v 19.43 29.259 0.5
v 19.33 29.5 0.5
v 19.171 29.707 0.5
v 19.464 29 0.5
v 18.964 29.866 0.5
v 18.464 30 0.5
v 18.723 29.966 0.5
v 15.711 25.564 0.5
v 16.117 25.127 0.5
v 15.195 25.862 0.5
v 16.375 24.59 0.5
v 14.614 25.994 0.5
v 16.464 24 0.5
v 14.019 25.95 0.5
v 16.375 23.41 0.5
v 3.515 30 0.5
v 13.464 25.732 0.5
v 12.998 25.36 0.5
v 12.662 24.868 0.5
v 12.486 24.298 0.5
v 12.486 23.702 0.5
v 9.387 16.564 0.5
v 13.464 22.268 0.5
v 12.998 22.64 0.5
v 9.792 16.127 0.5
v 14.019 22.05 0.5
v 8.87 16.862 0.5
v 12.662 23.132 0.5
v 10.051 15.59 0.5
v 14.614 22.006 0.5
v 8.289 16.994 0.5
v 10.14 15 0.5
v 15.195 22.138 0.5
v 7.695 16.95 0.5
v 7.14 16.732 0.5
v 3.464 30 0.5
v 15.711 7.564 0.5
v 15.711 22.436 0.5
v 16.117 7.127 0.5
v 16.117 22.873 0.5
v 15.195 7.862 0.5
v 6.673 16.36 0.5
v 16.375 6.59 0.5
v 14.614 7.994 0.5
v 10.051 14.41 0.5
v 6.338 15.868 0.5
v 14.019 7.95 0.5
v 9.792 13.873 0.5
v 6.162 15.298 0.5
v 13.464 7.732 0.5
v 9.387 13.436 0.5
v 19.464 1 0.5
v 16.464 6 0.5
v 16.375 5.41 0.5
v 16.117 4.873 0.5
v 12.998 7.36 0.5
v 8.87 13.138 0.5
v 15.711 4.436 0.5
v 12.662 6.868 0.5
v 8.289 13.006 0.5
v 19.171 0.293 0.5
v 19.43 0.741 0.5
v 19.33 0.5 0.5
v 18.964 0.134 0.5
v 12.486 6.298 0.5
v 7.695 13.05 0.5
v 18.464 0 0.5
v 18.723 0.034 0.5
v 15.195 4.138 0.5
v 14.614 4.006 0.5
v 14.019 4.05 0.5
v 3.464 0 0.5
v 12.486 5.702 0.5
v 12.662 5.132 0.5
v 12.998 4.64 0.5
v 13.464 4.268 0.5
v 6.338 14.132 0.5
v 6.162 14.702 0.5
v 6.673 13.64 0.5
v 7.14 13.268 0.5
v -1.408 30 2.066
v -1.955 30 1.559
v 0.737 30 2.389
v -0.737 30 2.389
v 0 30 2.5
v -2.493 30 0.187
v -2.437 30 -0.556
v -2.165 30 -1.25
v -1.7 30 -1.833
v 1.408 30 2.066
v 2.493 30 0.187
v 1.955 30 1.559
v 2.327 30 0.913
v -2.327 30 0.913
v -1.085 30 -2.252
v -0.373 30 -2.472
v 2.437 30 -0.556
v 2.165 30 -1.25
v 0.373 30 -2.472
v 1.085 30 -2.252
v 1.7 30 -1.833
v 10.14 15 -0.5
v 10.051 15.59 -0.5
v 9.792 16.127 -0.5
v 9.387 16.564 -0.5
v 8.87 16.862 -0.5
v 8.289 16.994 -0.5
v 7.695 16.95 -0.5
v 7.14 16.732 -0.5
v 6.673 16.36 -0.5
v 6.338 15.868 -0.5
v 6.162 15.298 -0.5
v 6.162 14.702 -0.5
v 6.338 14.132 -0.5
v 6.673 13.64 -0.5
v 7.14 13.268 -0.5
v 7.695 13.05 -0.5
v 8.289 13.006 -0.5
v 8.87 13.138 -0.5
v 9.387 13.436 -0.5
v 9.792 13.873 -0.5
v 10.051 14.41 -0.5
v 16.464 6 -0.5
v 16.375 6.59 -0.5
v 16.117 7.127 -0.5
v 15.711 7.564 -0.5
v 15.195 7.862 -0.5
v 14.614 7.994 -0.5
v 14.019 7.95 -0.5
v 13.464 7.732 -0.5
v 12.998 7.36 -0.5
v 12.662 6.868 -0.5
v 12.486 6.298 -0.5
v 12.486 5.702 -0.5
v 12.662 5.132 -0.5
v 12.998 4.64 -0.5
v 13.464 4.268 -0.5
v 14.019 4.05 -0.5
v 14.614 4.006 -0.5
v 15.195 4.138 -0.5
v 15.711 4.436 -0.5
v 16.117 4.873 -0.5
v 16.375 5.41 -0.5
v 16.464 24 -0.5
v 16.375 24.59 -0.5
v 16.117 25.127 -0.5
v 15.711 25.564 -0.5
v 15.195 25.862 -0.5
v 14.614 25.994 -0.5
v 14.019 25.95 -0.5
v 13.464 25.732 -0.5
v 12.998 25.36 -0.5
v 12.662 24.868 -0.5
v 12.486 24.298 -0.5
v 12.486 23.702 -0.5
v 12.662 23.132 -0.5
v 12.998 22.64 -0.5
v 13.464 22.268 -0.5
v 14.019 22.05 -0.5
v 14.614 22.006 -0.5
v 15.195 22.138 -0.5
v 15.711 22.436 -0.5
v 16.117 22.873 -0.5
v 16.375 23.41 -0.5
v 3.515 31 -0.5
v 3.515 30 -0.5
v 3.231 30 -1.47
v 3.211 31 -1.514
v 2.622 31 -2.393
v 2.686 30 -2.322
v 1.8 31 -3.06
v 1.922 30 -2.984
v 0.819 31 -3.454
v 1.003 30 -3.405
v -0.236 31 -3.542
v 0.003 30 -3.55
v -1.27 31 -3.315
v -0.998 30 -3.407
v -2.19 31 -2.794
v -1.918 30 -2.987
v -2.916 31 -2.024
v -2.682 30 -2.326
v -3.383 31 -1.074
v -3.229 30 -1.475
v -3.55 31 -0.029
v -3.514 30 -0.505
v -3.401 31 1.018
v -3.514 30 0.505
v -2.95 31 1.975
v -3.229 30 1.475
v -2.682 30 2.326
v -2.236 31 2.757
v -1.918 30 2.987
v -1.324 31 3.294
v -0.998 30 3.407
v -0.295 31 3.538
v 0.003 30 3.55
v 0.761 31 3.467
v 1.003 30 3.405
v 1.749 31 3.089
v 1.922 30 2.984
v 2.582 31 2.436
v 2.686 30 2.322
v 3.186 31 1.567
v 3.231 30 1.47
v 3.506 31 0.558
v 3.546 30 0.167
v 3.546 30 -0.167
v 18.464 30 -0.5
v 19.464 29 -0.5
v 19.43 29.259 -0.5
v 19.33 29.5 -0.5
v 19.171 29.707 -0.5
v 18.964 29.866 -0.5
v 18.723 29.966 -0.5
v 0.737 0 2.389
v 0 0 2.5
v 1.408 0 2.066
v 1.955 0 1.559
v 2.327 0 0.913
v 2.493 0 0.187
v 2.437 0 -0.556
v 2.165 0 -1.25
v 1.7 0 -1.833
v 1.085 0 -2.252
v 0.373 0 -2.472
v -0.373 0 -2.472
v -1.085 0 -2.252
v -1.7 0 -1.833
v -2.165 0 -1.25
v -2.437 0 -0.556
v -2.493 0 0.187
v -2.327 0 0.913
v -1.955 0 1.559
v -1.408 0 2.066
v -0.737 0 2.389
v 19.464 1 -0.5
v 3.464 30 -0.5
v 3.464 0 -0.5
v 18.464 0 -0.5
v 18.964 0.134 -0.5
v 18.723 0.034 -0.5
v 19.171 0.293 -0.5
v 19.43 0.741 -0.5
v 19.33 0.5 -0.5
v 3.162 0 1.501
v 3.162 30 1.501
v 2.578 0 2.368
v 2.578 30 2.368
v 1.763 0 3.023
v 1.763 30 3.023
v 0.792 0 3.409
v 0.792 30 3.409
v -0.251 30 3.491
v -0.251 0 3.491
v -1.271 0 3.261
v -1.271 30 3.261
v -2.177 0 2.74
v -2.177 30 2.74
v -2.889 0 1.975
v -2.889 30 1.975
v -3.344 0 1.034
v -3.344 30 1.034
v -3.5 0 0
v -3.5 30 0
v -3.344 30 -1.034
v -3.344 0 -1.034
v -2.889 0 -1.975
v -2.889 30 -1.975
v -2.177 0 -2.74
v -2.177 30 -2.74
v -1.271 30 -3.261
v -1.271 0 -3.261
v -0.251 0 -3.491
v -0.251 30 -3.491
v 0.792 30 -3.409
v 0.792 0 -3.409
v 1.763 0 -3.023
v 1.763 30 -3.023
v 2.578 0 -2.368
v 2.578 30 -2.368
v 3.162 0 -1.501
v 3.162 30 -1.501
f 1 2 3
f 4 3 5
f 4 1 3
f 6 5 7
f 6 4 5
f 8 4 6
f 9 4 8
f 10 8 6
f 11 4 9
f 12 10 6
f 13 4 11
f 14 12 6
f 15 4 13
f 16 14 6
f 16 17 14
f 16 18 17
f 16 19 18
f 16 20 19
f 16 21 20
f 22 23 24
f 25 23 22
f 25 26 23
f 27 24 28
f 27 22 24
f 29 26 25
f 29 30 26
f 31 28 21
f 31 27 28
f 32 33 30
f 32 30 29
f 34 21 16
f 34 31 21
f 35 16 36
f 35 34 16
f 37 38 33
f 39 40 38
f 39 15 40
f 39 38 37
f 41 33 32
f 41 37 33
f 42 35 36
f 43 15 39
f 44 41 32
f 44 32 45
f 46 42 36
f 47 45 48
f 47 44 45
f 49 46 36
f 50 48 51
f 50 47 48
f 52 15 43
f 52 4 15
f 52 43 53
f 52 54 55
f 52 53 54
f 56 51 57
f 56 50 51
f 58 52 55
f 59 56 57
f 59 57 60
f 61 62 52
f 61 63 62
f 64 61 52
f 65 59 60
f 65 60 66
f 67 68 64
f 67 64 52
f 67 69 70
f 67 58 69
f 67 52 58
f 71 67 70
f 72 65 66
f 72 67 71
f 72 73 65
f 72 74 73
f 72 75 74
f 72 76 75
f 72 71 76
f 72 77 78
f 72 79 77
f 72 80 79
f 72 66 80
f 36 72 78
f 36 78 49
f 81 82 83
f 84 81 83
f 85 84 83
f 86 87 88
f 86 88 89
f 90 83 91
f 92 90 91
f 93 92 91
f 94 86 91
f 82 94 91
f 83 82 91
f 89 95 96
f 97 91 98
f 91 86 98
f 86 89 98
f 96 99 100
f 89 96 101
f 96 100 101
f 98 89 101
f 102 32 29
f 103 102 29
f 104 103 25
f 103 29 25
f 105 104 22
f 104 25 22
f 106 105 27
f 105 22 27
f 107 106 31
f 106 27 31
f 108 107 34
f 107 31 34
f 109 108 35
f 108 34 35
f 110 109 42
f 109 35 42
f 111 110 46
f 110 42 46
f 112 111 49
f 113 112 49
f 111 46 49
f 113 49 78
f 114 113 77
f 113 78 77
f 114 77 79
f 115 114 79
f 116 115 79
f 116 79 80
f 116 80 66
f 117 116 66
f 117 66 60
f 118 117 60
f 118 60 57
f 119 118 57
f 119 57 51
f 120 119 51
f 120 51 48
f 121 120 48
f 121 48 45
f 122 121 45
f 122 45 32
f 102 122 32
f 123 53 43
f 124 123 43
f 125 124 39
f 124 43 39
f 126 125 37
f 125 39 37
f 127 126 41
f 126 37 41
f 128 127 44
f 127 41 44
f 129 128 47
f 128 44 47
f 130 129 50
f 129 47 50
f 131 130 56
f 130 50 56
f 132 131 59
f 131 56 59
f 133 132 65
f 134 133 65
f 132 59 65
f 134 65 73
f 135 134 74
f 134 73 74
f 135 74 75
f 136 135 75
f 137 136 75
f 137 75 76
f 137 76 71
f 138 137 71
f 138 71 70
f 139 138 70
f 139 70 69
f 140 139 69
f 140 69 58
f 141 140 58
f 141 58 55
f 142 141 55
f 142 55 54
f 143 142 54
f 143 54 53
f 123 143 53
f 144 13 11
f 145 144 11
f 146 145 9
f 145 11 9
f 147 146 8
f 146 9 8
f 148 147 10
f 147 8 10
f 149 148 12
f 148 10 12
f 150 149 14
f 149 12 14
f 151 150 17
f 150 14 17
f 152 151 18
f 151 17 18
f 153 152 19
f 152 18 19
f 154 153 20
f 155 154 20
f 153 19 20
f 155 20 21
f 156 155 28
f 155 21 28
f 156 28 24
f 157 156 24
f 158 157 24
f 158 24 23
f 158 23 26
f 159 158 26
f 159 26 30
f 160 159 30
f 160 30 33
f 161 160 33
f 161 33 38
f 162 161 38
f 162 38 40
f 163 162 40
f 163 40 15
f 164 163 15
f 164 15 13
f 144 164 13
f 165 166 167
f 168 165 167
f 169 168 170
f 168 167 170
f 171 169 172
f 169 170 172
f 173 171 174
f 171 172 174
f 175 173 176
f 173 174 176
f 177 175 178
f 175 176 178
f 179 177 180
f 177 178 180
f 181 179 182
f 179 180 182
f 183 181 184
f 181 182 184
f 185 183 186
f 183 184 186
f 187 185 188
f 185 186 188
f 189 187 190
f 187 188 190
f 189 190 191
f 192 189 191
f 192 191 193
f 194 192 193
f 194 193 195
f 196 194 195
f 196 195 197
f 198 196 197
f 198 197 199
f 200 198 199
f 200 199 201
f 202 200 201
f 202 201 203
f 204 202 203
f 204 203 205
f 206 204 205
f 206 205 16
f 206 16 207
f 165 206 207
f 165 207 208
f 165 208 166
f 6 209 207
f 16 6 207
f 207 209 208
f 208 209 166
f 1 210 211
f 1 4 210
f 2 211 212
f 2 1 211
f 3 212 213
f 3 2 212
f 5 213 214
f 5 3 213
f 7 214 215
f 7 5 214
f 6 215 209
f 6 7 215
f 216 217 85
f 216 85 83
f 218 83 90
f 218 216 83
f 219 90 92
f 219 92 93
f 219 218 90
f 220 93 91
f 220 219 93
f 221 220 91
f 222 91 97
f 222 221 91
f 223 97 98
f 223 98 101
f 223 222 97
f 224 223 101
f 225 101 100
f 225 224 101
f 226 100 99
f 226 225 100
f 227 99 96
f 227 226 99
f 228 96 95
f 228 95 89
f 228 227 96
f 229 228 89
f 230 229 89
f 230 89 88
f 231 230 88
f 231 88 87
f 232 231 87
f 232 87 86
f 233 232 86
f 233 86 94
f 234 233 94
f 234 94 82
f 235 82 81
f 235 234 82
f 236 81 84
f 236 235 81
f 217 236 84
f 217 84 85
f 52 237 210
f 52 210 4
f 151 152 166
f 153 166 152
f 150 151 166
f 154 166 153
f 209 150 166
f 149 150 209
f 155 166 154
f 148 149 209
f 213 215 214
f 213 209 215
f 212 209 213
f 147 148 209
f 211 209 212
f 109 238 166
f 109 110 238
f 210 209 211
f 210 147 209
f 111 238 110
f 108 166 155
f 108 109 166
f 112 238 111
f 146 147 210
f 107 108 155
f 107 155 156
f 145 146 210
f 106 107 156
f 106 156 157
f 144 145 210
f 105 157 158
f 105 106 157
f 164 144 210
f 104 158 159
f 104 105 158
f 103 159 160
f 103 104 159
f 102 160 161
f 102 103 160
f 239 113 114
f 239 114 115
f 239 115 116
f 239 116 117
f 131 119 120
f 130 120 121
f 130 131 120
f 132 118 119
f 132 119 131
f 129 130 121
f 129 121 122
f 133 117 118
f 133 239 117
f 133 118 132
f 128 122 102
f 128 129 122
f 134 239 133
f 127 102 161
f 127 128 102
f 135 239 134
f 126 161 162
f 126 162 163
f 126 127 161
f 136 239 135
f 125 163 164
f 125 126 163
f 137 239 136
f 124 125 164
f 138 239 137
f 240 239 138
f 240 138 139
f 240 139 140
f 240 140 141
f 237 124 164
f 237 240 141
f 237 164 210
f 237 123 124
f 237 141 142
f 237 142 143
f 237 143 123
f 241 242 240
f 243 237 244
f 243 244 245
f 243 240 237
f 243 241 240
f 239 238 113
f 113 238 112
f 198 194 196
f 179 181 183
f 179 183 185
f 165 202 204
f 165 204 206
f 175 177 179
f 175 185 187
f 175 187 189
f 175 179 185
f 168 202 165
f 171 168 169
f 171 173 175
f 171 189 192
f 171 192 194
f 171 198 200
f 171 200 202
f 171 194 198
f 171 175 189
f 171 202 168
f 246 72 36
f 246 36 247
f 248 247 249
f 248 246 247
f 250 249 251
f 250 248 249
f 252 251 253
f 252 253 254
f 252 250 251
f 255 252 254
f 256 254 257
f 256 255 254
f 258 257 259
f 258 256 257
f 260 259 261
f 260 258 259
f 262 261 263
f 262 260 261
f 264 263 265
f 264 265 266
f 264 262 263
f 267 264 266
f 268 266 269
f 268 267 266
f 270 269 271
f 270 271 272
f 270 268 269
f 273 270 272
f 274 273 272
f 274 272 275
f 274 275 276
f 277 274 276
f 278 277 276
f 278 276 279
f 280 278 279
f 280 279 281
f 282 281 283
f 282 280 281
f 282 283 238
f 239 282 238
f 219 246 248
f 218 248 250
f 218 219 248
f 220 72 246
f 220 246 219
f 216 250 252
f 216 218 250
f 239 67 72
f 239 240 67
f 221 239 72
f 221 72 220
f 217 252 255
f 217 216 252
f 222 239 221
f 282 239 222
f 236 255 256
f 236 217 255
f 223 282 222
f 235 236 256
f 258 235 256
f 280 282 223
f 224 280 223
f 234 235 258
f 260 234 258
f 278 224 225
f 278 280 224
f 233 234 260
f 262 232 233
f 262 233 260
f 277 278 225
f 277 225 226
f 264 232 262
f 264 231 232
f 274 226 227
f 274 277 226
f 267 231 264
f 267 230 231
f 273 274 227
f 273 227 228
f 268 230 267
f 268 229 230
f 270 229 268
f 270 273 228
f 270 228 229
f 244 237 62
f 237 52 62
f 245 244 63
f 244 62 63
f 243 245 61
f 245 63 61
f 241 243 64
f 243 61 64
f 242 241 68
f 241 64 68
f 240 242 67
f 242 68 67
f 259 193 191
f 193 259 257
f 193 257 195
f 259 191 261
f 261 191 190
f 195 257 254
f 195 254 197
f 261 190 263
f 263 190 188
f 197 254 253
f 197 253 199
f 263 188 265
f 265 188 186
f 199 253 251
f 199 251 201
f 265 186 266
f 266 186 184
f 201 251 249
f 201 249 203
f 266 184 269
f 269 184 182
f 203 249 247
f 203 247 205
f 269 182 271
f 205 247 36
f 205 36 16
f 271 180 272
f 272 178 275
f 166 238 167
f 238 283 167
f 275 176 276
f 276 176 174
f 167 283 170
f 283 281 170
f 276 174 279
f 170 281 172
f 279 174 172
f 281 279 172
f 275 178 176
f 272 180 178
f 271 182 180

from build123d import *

# Parameters (mm, degrees)
SKETCH_1_R          = 2.5
EXTRUDE_1_DEPTH     = 30
CUT_EXTRUDE_1_REACH = 37.984
SKETCH_2_R          = 2
FILLET_1_R          = 1
SKETCH_3_R          = 3.55
EXTRUDE_2_DEPTH     = 1


with BuildPart() as part:
    # 草图1 → 凸台-拉伸1 (new body)
    with BuildSketch(Plane(origin=(0, 0, 0), x_dir=(1, 0, 0), z_dir=(0, 1, 0))):
        with BuildLine():
            Line((19.464101615, -0.5), (3.464101615, -0.5))
            ThreePointArc((3.464101615, -0.5), (-3.5, 0), (3.464101615, 0.5))
            Line((3.464101615, 0.5), (19.464101615, 0.5))
            Line((19.464101615, 0.5), (19.464101615, -0.5))
        make_face()
        with Locations(Location((0, 0, 0), (0, 0, 270))):
            Circle(SKETCH_1_R, mode=Mode.SUBTRACT)
    extrude(amount=EXTRUDE_1_DEPTH)

    # 草图2 → 切除-拉伸1 (cut, up to next)
    with BuildSketch(Plane.XY.offset(0.5), mode=Mode.PRIVATE) as cut_extrude_1_sk1:
        with Locations((14.464101615, 24)):
            Circle(SKETCH_2_R)
    cut_extrude_1_tool1 = extrude(cut_extrude_1_sk1.sketch, amount=-CUT_EXTRUDE_1_REACH, mode=Mode.PRIVATE) & part.part
    # 草图2 → 切除-拉伸1 (cut, up to next)
    with BuildSketch(Plane.XY.offset(0.5), mode=Mode.PRIVATE) as cut_extrude_1_sk2:
        with Locations((8.139546295, 15)):
            Circle(SKETCH_2_R)
    cut_extrude_1_tool2 = extrude(cut_extrude_1_sk2.sketch, amount=-CUT_EXTRUDE_1_REACH, mode=Mode.PRIVATE) & part.part
    # 草图2 → 切除-拉伸1 (cut, up to next)
    with BuildSketch(Plane.XY.offset(0.5), mode=Mode.PRIVATE) as cut_extrude_1_sk3:
        with Locations((14.464101615, 6)):
            Circle(SKETCH_2_R)
    cut_extrude_1_tool3 = extrude(cut_extrude_1_sk3.sketch, amount=-CUT_EXTRUDE_1_REACH, mode=Mode.PRIVATE) & part.part
    add(cut_extrude_1_tool1.solids().sort_by_distance((14.464102, 24, 0.5))[0], mode=Mode.SUBTRACT)
    add(cut_extrude_1_tool2.solids().sort_by_distance((8.139546, 15, 0.5))[0], mode=Mode.SUBTRACT)
    add(cut_extrude_1_tool3.solids().sort_by_distance((14.464102, 6, 0.5))[0], mode=Mode.SUBTRACT)

    # 圆角1
    fillet_1_edges = [part.edges().sort_by_distance(p)[0] for p in [
        (19.464101615, 30, 0),
        (19.464101615, 0, 0),
    ]]
    fillet(fillet_1_edges, radius=FILLET_1_R)

    # 草图3 → 凸台-拉伸2 (add)
    with BuildSketch(Plane(origin=(0, 30, 0), x_dir=(1, 0, 0), z_dir=(0, 1, 0))):
        with Locations(Location((0, 0, 0), (0, 0, 8.09674977))):
            Circle(SKETCH_3_R)
    extrude(amount=EXTRUDE_2_DEPTH)


solid = part.part
